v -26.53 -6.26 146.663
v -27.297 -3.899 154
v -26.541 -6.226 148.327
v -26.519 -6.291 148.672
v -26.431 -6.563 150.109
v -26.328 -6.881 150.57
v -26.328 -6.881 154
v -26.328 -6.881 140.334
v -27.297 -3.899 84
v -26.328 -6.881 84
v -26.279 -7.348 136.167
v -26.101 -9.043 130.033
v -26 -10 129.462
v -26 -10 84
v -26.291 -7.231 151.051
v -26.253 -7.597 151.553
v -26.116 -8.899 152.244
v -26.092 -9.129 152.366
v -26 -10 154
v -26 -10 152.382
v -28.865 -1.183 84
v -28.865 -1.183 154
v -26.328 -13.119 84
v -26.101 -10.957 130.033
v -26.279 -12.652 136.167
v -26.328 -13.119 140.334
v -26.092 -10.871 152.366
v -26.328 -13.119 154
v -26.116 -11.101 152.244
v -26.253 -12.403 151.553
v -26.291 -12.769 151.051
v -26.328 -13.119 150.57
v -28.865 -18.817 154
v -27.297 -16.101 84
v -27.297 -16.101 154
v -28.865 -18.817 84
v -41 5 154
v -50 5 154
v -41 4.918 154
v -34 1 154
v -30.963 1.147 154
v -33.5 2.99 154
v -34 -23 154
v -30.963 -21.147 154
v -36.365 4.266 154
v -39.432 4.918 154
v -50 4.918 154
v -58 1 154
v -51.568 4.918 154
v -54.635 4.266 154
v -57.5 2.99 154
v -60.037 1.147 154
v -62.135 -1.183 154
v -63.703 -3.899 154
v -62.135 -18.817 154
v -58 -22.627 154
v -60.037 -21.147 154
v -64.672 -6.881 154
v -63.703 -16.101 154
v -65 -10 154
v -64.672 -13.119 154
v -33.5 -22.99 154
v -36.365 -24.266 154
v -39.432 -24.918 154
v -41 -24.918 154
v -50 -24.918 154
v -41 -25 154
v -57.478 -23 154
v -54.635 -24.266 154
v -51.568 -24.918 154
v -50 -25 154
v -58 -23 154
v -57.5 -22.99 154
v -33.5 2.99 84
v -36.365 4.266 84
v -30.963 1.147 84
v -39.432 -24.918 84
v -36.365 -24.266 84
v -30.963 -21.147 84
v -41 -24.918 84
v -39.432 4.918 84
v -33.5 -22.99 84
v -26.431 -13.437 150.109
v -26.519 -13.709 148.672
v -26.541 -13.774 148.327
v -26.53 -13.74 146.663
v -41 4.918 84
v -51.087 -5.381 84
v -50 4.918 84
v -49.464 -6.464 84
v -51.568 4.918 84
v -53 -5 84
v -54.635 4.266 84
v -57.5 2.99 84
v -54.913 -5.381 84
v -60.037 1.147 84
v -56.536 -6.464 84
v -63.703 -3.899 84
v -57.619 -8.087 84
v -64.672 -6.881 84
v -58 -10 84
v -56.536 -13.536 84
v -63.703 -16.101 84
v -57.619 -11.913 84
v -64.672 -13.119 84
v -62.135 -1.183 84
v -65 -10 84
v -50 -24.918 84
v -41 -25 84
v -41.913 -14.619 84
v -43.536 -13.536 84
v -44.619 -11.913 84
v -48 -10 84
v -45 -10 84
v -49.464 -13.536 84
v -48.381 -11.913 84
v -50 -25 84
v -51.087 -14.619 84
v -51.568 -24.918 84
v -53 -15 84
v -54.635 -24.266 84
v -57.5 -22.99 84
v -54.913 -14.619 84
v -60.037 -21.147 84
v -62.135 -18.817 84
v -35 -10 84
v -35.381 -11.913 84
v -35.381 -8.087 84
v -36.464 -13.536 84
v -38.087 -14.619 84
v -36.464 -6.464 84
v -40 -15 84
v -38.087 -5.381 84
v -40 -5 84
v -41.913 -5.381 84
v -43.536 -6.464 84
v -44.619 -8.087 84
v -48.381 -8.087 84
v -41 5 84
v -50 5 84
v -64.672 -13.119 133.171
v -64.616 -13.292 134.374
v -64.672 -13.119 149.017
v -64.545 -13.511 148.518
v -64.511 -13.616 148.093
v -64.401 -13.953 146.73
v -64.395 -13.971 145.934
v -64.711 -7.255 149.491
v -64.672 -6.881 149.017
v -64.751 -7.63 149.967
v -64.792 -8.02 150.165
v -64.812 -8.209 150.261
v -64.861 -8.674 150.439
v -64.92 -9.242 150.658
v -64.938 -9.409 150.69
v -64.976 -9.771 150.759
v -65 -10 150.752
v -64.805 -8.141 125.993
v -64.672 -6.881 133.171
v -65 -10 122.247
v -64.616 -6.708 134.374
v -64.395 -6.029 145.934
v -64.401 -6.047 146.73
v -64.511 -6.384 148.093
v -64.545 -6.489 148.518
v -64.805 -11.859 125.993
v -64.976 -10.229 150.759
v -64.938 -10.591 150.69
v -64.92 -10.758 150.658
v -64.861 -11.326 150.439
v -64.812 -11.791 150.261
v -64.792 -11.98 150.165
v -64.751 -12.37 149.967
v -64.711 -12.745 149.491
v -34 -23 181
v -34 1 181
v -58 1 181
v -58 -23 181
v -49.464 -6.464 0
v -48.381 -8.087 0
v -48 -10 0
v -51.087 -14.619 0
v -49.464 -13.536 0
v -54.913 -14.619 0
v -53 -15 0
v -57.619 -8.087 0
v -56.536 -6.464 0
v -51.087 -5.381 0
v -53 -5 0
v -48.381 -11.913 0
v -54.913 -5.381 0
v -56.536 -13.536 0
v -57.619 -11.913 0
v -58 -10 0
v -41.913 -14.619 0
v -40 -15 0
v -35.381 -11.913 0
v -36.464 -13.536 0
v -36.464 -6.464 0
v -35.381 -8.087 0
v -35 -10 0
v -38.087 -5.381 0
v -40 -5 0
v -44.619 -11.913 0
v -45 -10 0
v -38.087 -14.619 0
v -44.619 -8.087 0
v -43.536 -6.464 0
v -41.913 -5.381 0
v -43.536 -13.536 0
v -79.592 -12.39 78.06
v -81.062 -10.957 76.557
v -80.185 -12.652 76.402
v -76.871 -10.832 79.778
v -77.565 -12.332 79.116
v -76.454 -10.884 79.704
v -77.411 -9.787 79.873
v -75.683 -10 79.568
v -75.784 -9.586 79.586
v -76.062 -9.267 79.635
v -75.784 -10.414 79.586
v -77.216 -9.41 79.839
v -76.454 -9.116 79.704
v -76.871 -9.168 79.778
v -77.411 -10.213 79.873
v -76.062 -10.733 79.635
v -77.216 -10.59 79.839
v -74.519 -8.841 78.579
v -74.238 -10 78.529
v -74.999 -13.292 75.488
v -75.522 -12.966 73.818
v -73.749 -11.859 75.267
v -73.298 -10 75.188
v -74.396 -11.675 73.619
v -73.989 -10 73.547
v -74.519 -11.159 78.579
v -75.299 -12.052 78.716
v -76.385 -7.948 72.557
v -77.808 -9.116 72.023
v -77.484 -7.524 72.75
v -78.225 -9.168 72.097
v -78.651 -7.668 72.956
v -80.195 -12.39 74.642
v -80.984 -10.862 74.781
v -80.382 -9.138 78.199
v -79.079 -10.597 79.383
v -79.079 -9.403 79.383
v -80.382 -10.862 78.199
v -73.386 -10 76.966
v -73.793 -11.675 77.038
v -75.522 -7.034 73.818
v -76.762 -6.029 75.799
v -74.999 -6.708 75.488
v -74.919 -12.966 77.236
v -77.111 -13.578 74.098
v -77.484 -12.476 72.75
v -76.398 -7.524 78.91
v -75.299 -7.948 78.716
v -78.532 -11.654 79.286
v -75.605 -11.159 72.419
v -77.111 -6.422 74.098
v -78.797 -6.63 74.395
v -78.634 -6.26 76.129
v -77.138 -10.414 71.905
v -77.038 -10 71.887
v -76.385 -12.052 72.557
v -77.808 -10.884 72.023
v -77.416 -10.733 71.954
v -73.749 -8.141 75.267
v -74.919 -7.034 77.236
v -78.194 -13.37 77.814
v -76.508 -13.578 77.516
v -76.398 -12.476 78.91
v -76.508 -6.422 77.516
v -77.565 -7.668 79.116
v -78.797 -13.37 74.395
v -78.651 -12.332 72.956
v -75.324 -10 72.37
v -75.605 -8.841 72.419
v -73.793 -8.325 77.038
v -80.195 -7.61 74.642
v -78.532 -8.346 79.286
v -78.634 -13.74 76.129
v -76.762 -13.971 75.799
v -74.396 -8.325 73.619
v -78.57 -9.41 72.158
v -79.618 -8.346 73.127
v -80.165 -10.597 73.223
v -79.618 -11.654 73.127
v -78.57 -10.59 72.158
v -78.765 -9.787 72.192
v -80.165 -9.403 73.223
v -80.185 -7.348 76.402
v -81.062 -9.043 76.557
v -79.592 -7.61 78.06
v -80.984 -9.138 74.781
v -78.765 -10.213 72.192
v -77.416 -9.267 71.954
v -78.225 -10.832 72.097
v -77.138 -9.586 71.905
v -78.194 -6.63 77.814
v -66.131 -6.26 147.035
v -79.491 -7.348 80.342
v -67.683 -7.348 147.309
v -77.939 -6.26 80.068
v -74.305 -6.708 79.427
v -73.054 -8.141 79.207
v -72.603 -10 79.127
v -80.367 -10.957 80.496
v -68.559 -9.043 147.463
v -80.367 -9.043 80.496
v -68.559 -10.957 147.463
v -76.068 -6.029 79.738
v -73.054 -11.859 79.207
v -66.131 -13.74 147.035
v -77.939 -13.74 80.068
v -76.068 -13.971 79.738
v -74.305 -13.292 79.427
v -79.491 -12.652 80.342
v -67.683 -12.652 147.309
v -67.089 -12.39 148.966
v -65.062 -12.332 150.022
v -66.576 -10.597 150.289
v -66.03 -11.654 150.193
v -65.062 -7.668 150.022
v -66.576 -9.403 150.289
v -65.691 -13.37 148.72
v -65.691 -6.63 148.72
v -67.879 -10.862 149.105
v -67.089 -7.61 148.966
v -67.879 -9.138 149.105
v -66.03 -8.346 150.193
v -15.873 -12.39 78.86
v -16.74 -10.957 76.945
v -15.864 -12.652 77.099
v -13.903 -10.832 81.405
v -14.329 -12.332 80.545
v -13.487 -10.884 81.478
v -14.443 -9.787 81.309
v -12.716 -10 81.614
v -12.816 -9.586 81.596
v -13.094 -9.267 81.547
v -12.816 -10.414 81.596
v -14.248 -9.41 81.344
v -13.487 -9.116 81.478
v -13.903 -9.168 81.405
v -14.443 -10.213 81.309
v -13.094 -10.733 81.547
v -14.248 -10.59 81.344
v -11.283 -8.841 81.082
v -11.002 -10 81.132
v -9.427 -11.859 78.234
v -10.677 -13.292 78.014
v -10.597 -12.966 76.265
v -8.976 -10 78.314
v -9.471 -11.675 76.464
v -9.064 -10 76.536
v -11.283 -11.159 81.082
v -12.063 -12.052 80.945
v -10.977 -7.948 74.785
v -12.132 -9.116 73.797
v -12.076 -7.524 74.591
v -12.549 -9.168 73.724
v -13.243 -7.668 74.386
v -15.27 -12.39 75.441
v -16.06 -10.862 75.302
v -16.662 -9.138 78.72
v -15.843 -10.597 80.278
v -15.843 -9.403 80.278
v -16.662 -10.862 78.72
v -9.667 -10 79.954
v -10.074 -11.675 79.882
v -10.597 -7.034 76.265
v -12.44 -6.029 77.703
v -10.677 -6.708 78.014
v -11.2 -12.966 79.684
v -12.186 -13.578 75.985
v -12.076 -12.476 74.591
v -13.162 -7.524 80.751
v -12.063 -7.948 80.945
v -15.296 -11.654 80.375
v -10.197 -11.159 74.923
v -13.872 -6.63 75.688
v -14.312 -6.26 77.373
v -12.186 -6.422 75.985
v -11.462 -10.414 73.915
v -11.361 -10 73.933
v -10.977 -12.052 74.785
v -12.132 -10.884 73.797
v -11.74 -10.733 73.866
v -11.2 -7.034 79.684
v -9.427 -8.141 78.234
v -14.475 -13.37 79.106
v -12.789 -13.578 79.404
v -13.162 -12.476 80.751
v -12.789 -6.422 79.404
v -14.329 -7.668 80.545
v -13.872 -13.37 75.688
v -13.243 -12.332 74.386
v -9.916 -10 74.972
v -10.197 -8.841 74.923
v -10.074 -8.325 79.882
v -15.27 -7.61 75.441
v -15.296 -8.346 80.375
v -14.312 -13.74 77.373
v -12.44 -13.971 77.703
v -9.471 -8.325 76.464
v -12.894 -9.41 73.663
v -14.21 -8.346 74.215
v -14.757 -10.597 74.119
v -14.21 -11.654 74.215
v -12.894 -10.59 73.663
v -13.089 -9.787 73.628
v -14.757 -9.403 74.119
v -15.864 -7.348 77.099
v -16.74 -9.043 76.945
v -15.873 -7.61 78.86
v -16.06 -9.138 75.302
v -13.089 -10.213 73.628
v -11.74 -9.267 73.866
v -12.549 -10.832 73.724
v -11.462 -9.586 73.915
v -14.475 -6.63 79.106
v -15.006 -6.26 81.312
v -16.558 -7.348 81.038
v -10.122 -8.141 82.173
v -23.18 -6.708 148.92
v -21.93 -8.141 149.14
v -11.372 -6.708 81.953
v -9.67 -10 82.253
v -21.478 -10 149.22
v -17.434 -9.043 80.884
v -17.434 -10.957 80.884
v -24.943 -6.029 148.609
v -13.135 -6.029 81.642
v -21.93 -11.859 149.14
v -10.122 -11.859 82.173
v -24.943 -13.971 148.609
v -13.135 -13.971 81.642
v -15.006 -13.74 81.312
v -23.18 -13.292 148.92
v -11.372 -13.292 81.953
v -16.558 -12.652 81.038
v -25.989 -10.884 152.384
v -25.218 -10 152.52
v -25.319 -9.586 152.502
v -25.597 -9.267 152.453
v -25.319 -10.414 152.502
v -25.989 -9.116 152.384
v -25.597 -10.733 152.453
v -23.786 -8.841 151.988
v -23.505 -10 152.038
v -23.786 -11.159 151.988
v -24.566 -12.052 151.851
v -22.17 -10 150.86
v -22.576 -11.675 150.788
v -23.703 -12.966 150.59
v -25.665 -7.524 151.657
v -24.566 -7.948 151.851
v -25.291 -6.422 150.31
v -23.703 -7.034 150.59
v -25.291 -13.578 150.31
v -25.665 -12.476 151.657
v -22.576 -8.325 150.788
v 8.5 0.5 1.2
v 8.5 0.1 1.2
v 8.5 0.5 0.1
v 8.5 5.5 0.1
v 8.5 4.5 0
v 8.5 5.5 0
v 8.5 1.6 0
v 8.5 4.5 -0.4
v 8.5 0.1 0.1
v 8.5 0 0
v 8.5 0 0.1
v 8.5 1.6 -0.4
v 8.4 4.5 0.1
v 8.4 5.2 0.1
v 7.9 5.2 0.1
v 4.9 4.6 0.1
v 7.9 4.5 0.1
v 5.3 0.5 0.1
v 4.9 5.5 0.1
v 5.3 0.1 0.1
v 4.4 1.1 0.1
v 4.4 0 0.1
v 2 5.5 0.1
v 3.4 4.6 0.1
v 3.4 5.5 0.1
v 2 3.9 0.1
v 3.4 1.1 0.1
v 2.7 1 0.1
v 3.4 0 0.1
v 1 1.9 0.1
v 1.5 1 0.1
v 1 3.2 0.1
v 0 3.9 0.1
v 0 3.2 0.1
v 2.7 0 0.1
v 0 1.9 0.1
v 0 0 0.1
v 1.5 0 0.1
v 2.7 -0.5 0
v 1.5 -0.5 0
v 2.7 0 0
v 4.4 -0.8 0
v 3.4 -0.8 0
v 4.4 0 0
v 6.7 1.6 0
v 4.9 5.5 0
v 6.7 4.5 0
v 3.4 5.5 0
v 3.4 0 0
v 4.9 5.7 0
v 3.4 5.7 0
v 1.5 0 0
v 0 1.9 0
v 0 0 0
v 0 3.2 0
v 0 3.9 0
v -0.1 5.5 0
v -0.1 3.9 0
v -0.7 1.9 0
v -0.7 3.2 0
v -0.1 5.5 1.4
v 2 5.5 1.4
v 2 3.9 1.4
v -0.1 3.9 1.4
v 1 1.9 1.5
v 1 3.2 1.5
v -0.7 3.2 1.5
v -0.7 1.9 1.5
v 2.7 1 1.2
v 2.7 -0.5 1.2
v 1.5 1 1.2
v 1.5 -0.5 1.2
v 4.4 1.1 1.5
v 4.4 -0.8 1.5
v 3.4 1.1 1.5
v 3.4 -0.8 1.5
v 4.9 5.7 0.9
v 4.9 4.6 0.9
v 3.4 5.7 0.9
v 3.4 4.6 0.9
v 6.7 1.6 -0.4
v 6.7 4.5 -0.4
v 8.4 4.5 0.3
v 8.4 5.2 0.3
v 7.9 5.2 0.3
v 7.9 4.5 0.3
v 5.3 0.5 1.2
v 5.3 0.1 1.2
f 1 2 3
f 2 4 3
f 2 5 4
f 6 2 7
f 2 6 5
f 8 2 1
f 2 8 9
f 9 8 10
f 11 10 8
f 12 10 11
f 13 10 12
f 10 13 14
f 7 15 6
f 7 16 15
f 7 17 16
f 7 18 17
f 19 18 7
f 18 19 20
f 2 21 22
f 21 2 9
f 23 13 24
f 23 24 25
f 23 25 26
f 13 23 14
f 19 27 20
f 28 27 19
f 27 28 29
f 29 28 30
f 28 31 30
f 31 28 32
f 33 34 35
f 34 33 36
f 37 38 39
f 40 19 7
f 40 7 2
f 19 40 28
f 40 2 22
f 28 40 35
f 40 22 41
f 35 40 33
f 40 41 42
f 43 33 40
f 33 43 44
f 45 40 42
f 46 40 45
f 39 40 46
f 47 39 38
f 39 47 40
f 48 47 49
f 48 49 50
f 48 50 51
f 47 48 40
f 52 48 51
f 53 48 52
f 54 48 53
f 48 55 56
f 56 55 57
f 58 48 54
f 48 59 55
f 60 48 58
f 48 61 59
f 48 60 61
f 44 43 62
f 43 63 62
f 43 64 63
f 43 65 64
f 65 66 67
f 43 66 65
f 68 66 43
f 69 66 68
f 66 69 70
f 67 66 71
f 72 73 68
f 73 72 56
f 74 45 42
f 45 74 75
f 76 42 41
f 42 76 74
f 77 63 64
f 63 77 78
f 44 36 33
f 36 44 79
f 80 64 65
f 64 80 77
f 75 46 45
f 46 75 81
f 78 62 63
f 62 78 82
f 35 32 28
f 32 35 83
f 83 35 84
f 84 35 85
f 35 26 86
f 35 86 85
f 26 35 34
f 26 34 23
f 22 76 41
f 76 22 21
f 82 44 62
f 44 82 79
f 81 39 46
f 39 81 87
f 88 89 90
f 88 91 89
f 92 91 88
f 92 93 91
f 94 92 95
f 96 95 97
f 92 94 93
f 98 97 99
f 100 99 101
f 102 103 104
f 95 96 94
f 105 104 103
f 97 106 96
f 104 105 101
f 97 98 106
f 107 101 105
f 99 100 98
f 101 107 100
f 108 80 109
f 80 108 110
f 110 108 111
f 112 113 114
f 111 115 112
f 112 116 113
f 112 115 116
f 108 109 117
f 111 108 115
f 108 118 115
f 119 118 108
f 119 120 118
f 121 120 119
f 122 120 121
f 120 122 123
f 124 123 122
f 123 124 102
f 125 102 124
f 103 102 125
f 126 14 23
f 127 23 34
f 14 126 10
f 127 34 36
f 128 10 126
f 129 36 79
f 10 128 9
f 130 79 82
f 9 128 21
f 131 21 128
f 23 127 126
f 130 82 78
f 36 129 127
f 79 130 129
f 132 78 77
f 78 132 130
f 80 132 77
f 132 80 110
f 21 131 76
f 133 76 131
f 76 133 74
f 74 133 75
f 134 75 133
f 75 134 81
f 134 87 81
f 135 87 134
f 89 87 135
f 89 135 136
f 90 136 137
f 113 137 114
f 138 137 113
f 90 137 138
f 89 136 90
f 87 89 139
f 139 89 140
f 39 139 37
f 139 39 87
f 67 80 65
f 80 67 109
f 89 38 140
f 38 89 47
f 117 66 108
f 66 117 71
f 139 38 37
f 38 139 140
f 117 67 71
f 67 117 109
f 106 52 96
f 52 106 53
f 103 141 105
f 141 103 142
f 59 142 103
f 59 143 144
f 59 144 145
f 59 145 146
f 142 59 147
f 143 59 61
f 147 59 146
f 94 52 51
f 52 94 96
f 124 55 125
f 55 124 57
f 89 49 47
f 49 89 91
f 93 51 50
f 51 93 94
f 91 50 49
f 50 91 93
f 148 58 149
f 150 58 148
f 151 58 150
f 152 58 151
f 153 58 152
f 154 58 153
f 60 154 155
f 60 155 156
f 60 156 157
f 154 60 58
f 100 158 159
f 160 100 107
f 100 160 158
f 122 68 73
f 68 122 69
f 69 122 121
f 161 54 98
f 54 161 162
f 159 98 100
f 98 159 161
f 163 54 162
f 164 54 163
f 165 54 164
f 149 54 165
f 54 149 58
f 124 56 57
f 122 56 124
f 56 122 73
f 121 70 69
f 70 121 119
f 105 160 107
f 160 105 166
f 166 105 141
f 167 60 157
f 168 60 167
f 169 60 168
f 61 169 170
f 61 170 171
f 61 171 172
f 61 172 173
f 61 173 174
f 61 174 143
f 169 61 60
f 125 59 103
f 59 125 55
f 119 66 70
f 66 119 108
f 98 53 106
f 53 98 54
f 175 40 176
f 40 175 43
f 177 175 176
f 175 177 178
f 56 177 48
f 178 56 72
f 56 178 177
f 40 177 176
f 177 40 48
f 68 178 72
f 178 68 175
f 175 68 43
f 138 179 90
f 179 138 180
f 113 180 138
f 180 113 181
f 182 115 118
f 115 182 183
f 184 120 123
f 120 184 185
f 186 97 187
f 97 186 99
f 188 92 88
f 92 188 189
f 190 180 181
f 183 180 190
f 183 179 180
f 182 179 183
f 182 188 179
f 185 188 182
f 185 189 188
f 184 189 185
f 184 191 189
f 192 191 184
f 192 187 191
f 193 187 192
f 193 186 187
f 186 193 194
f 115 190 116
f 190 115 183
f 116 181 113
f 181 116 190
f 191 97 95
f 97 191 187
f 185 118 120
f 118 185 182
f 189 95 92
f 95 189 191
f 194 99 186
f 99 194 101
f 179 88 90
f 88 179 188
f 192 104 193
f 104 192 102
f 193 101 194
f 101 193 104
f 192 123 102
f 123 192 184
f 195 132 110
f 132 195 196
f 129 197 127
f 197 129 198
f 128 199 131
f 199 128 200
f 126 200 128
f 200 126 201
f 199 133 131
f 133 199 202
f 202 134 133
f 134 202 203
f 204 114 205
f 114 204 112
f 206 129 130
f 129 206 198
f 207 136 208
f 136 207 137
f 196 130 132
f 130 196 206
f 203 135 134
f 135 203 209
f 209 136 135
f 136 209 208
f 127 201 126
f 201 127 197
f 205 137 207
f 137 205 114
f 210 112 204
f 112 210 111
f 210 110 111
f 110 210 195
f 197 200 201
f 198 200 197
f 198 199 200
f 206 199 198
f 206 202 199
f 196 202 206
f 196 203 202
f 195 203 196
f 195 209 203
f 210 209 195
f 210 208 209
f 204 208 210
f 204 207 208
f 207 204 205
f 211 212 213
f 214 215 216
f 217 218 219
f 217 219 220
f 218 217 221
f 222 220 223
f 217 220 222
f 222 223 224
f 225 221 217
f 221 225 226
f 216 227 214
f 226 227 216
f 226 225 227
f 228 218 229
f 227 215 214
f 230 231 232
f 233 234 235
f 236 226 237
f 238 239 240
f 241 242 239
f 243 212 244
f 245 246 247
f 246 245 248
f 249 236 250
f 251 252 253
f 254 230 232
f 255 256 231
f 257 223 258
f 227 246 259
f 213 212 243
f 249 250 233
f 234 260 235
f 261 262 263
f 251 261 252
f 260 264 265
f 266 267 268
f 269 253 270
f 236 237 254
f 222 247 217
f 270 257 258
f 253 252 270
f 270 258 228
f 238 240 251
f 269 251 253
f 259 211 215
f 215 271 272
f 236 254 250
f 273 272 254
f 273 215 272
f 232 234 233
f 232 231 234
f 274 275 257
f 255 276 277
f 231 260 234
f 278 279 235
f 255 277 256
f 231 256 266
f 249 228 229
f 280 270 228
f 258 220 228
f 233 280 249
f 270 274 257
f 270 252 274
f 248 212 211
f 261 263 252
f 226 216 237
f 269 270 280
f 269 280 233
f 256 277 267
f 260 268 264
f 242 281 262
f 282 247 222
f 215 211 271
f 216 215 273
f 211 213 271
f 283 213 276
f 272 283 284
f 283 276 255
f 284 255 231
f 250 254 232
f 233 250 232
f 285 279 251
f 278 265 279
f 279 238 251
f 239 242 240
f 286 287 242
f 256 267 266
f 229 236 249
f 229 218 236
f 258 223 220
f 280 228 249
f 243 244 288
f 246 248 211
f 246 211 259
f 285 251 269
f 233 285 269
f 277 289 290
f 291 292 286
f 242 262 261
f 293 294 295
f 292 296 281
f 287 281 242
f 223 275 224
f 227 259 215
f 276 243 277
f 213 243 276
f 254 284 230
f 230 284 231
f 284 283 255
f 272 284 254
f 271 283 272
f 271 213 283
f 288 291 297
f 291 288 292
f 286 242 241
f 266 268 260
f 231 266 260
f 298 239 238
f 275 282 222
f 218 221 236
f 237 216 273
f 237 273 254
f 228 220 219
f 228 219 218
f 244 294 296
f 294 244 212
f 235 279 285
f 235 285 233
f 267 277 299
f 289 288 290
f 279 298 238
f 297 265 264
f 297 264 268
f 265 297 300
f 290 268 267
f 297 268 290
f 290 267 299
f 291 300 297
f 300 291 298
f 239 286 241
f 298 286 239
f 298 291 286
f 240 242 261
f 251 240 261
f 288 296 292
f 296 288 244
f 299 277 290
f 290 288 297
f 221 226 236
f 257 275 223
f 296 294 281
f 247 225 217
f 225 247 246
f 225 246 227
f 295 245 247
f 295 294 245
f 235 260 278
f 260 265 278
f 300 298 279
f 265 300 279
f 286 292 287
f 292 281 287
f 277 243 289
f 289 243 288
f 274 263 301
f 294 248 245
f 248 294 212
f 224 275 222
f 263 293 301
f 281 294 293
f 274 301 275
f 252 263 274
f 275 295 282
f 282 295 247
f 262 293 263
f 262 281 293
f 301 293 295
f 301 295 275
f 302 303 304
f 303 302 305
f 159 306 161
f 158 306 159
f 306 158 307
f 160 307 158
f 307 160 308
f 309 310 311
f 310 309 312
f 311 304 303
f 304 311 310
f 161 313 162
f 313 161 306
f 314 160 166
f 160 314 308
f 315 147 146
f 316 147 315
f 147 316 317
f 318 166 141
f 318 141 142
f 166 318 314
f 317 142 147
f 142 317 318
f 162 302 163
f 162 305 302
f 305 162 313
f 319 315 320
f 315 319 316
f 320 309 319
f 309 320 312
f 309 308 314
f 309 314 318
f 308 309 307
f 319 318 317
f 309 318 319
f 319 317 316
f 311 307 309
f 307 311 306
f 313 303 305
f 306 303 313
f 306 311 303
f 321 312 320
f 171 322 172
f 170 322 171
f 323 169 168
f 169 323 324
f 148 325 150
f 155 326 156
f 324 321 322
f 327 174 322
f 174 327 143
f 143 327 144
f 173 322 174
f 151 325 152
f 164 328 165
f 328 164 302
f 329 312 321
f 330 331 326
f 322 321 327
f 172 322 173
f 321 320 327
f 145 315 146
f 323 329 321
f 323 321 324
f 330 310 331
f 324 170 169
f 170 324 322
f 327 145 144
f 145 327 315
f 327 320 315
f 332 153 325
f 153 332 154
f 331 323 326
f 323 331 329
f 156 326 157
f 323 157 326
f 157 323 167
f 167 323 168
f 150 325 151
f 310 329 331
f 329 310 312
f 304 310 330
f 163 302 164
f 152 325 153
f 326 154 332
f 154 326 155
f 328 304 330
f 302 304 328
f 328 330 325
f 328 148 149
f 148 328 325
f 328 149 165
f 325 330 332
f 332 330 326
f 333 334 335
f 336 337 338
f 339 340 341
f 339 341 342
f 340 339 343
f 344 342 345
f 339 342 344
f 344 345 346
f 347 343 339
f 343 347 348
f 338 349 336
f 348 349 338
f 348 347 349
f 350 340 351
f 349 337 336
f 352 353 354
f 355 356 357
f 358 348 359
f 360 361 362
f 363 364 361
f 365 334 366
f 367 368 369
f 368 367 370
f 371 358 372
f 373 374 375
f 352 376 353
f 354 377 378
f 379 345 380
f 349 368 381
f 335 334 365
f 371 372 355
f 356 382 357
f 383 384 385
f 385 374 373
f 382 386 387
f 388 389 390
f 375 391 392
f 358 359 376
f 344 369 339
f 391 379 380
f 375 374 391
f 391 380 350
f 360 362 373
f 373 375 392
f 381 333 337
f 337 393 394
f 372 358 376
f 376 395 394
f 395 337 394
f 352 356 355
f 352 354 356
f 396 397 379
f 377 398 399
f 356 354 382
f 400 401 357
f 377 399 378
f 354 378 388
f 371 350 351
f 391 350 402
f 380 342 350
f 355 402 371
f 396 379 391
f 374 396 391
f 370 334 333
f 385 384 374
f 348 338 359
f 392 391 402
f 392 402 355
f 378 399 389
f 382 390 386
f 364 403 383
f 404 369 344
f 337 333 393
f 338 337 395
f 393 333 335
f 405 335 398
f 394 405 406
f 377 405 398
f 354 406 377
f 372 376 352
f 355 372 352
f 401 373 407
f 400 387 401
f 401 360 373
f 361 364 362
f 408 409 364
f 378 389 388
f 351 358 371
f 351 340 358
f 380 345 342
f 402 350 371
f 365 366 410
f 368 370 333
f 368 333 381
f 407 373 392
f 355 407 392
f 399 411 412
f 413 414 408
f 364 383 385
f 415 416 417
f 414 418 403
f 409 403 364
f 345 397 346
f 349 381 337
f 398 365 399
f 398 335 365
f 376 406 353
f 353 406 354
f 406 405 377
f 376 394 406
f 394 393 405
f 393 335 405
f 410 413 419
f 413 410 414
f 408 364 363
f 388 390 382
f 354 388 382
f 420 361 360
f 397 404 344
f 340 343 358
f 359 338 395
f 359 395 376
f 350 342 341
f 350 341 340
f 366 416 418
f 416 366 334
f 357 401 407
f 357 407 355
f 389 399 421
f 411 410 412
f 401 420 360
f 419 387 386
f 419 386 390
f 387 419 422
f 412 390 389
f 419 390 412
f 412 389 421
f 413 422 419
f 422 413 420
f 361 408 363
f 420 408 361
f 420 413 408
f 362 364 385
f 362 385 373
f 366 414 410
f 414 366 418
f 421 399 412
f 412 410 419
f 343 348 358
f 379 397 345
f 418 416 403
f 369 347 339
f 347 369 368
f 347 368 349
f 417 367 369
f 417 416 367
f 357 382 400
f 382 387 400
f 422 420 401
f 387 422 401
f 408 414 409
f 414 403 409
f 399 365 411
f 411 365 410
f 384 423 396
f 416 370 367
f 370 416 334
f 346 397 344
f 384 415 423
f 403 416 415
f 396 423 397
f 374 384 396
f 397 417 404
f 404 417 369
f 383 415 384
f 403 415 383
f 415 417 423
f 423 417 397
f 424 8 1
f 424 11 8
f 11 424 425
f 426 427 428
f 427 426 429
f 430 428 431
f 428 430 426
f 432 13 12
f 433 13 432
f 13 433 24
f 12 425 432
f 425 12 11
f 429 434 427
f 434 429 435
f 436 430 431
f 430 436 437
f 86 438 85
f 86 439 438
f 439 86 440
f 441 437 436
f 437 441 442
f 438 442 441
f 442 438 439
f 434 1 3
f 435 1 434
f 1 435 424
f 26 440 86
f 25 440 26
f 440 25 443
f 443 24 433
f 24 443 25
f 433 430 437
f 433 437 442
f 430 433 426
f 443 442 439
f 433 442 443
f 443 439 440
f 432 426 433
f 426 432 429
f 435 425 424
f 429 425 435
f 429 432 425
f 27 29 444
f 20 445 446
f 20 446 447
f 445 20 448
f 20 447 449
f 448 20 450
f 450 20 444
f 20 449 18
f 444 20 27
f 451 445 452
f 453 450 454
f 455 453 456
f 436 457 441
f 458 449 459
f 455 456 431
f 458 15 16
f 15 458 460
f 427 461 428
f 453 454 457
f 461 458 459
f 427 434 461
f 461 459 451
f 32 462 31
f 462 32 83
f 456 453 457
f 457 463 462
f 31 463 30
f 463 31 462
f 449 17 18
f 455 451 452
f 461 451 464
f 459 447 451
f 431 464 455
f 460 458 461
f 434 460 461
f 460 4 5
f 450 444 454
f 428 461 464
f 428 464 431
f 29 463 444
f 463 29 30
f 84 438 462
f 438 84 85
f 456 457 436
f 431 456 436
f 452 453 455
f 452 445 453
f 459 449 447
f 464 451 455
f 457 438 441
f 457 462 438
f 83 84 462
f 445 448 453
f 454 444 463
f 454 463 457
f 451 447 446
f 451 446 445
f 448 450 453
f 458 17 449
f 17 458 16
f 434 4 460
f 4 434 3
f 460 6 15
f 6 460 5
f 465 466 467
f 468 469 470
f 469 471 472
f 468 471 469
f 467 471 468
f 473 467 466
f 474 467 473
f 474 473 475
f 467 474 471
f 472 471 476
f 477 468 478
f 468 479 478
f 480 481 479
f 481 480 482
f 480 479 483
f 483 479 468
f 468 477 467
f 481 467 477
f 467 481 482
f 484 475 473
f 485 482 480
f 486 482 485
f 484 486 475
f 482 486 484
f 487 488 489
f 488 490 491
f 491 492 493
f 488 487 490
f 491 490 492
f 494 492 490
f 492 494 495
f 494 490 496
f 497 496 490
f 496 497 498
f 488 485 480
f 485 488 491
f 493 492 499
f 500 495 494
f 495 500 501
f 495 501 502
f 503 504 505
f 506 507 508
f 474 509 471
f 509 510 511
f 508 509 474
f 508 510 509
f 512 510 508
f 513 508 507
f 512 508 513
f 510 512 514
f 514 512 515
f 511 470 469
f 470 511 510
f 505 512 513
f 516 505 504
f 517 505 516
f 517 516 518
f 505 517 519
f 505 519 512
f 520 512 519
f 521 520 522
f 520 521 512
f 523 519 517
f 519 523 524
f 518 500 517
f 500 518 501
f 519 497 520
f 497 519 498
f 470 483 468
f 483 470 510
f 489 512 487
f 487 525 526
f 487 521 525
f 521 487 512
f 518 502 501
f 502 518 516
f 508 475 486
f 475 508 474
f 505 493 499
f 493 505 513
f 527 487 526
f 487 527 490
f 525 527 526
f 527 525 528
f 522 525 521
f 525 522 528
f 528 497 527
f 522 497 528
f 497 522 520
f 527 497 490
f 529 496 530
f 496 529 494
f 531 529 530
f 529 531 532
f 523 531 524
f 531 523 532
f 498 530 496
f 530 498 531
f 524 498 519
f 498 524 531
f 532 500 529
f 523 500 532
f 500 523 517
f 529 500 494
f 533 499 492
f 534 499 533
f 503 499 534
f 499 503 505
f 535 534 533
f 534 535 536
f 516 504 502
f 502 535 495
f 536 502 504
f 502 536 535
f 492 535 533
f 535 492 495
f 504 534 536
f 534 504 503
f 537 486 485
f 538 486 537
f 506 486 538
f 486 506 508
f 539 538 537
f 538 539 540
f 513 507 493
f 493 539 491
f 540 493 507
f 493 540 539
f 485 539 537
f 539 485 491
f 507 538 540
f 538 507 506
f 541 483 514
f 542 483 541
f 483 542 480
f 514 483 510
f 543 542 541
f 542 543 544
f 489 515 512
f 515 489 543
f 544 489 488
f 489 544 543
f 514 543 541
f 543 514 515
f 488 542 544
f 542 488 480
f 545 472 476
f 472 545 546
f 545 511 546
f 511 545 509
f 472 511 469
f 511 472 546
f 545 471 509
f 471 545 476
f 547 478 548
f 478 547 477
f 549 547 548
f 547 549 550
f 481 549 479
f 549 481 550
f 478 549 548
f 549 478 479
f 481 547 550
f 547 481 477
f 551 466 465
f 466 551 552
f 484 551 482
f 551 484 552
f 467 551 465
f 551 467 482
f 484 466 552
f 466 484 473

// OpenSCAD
union() {
	translate(v = [-50, -10, 0]) {
		color(c = [0.1000000000, 0.9000000000, 0.1000000000]) {
			union() {
				union() {
					translate(v = [0, 0, 84]) {
						union() {
							cylinder(h = 70, r = 15);
							union() {
								translate(v = [9, 0, 0]) {
									cylinder(h = 70, r = 15);
								}
								translate(v = [0, -15, 0]) {
									cube(size = [9, 30, 70]);
								}
							}
						}
					}
					translate(v = [-8, -13, 154]) {
						cube(size = [24, 24, 27]);
					}
				}
				union() {
					union() {
						translate(v = [-3, 0, 0]) {
							cylinder(h = 84, r = 5);
						}
						translate(v = [13, 0, 0]) {
							translate(v = [-3, 0, 0]) {
								cylinder(h = 84, r = 5);
							}
						}
					}
					union() {
						rotate(a = [0, 10, 0]) {
							translate(v = [-40, 0, 70]) {
								union() {
									union() {
										sphere(r = 4);
										translate(v = [0, 0, 4]) {
											cylinder(h = 68, r = 4);
										}
									}
									translate(v = [0, 0, 72]) {
										sphere(r = 4);
									}
								}
							}
						}
						rotate(a = [0, -10, 0]) {
							translate(v = [50, 0, 70]) {
								union() {
									union() {
										sphere(r = 4);
										translate(v = [0, 0, 4]) {
											cylinder(h = 68, r = 4);
										}
									}
									translate(v = [0, 0, 72]) {
										sphere(r = 4);
									}
								}
							}
						}
					}
				}
			}
		}
	}
	union() {
		union() {
			union() {
				color(c = [0, 0.7000000000, 0.1000000000]) {
					cube(size = [8.5000000000, 5.5000000000, 0.1000000000]);
				}
				color(c = [0.8196078431, 0.8196078431, 0.8196078431]) {
					translate(v = [-0.1000000000, 3.9000000000, 0]) {
						cube(size = [2.1000000000, 1.6000000000, 1.4000000000]);
					}
				}
			}
			union() {
				translate(v = [-0.7000000000, 1.9000000000, 0]) {
					color(c = [0.8196078431, 0.8196078431, 0.8196078431]) {
						cube(size = [1.7000000000, 1.3000000000, 1.5000000000]);
					}
				}
				translate(v = [1.5000000000, -0.5000000000, 0]) {
					color(c = [0, 0, 0]) {
						cube(size = [1.2000000000, 1.5000000000, 1.2000000000]);
					}
				}
			}
		}
		union() {
			union() {
				translate(v = [3.4000000000, -0.8000000000, 0]) {
					color(c = [1.0000000000, 0.7372549020, 0.2352941176]) {
						cube(size = [1, 1.9000000000, 1.5000000000]);
					}
				}
				translate(v = [3.4000000000, 4.6000000000, 0]) {
					color(c = [0.8196078431, 0.8196078431, 0.8196078431]) {
						cube(size = [1.5000000000, 1.1000000000, 0.9000000000]);
					}
				}
			}
			union() {
				translate(v = [5.3000000000, 0.1000000000, 0]) {
					color(c = [0, 0, 0]) {
						cube(size = [3.2000000000, 0.4000000000, 1.2000000000]);
					}
				}
				union() {
					translate(v = [6.7000000000, 1.6000000000, -0.4000000000]) {
						color(c = [0, 0, 0]) {
							cube(size = [1.8000000000, 2.9000000000, 0.4000000000]);
						}
					}
					translate(v = [7.9000000000, 4.5000000000, 0]) {
						color(c = [0, 0, 0]) {
							cube(size = [0.5000000000, 0.7000000000, 0.3000000000]);
						}
					}
				}
			}
		}
	}
}
